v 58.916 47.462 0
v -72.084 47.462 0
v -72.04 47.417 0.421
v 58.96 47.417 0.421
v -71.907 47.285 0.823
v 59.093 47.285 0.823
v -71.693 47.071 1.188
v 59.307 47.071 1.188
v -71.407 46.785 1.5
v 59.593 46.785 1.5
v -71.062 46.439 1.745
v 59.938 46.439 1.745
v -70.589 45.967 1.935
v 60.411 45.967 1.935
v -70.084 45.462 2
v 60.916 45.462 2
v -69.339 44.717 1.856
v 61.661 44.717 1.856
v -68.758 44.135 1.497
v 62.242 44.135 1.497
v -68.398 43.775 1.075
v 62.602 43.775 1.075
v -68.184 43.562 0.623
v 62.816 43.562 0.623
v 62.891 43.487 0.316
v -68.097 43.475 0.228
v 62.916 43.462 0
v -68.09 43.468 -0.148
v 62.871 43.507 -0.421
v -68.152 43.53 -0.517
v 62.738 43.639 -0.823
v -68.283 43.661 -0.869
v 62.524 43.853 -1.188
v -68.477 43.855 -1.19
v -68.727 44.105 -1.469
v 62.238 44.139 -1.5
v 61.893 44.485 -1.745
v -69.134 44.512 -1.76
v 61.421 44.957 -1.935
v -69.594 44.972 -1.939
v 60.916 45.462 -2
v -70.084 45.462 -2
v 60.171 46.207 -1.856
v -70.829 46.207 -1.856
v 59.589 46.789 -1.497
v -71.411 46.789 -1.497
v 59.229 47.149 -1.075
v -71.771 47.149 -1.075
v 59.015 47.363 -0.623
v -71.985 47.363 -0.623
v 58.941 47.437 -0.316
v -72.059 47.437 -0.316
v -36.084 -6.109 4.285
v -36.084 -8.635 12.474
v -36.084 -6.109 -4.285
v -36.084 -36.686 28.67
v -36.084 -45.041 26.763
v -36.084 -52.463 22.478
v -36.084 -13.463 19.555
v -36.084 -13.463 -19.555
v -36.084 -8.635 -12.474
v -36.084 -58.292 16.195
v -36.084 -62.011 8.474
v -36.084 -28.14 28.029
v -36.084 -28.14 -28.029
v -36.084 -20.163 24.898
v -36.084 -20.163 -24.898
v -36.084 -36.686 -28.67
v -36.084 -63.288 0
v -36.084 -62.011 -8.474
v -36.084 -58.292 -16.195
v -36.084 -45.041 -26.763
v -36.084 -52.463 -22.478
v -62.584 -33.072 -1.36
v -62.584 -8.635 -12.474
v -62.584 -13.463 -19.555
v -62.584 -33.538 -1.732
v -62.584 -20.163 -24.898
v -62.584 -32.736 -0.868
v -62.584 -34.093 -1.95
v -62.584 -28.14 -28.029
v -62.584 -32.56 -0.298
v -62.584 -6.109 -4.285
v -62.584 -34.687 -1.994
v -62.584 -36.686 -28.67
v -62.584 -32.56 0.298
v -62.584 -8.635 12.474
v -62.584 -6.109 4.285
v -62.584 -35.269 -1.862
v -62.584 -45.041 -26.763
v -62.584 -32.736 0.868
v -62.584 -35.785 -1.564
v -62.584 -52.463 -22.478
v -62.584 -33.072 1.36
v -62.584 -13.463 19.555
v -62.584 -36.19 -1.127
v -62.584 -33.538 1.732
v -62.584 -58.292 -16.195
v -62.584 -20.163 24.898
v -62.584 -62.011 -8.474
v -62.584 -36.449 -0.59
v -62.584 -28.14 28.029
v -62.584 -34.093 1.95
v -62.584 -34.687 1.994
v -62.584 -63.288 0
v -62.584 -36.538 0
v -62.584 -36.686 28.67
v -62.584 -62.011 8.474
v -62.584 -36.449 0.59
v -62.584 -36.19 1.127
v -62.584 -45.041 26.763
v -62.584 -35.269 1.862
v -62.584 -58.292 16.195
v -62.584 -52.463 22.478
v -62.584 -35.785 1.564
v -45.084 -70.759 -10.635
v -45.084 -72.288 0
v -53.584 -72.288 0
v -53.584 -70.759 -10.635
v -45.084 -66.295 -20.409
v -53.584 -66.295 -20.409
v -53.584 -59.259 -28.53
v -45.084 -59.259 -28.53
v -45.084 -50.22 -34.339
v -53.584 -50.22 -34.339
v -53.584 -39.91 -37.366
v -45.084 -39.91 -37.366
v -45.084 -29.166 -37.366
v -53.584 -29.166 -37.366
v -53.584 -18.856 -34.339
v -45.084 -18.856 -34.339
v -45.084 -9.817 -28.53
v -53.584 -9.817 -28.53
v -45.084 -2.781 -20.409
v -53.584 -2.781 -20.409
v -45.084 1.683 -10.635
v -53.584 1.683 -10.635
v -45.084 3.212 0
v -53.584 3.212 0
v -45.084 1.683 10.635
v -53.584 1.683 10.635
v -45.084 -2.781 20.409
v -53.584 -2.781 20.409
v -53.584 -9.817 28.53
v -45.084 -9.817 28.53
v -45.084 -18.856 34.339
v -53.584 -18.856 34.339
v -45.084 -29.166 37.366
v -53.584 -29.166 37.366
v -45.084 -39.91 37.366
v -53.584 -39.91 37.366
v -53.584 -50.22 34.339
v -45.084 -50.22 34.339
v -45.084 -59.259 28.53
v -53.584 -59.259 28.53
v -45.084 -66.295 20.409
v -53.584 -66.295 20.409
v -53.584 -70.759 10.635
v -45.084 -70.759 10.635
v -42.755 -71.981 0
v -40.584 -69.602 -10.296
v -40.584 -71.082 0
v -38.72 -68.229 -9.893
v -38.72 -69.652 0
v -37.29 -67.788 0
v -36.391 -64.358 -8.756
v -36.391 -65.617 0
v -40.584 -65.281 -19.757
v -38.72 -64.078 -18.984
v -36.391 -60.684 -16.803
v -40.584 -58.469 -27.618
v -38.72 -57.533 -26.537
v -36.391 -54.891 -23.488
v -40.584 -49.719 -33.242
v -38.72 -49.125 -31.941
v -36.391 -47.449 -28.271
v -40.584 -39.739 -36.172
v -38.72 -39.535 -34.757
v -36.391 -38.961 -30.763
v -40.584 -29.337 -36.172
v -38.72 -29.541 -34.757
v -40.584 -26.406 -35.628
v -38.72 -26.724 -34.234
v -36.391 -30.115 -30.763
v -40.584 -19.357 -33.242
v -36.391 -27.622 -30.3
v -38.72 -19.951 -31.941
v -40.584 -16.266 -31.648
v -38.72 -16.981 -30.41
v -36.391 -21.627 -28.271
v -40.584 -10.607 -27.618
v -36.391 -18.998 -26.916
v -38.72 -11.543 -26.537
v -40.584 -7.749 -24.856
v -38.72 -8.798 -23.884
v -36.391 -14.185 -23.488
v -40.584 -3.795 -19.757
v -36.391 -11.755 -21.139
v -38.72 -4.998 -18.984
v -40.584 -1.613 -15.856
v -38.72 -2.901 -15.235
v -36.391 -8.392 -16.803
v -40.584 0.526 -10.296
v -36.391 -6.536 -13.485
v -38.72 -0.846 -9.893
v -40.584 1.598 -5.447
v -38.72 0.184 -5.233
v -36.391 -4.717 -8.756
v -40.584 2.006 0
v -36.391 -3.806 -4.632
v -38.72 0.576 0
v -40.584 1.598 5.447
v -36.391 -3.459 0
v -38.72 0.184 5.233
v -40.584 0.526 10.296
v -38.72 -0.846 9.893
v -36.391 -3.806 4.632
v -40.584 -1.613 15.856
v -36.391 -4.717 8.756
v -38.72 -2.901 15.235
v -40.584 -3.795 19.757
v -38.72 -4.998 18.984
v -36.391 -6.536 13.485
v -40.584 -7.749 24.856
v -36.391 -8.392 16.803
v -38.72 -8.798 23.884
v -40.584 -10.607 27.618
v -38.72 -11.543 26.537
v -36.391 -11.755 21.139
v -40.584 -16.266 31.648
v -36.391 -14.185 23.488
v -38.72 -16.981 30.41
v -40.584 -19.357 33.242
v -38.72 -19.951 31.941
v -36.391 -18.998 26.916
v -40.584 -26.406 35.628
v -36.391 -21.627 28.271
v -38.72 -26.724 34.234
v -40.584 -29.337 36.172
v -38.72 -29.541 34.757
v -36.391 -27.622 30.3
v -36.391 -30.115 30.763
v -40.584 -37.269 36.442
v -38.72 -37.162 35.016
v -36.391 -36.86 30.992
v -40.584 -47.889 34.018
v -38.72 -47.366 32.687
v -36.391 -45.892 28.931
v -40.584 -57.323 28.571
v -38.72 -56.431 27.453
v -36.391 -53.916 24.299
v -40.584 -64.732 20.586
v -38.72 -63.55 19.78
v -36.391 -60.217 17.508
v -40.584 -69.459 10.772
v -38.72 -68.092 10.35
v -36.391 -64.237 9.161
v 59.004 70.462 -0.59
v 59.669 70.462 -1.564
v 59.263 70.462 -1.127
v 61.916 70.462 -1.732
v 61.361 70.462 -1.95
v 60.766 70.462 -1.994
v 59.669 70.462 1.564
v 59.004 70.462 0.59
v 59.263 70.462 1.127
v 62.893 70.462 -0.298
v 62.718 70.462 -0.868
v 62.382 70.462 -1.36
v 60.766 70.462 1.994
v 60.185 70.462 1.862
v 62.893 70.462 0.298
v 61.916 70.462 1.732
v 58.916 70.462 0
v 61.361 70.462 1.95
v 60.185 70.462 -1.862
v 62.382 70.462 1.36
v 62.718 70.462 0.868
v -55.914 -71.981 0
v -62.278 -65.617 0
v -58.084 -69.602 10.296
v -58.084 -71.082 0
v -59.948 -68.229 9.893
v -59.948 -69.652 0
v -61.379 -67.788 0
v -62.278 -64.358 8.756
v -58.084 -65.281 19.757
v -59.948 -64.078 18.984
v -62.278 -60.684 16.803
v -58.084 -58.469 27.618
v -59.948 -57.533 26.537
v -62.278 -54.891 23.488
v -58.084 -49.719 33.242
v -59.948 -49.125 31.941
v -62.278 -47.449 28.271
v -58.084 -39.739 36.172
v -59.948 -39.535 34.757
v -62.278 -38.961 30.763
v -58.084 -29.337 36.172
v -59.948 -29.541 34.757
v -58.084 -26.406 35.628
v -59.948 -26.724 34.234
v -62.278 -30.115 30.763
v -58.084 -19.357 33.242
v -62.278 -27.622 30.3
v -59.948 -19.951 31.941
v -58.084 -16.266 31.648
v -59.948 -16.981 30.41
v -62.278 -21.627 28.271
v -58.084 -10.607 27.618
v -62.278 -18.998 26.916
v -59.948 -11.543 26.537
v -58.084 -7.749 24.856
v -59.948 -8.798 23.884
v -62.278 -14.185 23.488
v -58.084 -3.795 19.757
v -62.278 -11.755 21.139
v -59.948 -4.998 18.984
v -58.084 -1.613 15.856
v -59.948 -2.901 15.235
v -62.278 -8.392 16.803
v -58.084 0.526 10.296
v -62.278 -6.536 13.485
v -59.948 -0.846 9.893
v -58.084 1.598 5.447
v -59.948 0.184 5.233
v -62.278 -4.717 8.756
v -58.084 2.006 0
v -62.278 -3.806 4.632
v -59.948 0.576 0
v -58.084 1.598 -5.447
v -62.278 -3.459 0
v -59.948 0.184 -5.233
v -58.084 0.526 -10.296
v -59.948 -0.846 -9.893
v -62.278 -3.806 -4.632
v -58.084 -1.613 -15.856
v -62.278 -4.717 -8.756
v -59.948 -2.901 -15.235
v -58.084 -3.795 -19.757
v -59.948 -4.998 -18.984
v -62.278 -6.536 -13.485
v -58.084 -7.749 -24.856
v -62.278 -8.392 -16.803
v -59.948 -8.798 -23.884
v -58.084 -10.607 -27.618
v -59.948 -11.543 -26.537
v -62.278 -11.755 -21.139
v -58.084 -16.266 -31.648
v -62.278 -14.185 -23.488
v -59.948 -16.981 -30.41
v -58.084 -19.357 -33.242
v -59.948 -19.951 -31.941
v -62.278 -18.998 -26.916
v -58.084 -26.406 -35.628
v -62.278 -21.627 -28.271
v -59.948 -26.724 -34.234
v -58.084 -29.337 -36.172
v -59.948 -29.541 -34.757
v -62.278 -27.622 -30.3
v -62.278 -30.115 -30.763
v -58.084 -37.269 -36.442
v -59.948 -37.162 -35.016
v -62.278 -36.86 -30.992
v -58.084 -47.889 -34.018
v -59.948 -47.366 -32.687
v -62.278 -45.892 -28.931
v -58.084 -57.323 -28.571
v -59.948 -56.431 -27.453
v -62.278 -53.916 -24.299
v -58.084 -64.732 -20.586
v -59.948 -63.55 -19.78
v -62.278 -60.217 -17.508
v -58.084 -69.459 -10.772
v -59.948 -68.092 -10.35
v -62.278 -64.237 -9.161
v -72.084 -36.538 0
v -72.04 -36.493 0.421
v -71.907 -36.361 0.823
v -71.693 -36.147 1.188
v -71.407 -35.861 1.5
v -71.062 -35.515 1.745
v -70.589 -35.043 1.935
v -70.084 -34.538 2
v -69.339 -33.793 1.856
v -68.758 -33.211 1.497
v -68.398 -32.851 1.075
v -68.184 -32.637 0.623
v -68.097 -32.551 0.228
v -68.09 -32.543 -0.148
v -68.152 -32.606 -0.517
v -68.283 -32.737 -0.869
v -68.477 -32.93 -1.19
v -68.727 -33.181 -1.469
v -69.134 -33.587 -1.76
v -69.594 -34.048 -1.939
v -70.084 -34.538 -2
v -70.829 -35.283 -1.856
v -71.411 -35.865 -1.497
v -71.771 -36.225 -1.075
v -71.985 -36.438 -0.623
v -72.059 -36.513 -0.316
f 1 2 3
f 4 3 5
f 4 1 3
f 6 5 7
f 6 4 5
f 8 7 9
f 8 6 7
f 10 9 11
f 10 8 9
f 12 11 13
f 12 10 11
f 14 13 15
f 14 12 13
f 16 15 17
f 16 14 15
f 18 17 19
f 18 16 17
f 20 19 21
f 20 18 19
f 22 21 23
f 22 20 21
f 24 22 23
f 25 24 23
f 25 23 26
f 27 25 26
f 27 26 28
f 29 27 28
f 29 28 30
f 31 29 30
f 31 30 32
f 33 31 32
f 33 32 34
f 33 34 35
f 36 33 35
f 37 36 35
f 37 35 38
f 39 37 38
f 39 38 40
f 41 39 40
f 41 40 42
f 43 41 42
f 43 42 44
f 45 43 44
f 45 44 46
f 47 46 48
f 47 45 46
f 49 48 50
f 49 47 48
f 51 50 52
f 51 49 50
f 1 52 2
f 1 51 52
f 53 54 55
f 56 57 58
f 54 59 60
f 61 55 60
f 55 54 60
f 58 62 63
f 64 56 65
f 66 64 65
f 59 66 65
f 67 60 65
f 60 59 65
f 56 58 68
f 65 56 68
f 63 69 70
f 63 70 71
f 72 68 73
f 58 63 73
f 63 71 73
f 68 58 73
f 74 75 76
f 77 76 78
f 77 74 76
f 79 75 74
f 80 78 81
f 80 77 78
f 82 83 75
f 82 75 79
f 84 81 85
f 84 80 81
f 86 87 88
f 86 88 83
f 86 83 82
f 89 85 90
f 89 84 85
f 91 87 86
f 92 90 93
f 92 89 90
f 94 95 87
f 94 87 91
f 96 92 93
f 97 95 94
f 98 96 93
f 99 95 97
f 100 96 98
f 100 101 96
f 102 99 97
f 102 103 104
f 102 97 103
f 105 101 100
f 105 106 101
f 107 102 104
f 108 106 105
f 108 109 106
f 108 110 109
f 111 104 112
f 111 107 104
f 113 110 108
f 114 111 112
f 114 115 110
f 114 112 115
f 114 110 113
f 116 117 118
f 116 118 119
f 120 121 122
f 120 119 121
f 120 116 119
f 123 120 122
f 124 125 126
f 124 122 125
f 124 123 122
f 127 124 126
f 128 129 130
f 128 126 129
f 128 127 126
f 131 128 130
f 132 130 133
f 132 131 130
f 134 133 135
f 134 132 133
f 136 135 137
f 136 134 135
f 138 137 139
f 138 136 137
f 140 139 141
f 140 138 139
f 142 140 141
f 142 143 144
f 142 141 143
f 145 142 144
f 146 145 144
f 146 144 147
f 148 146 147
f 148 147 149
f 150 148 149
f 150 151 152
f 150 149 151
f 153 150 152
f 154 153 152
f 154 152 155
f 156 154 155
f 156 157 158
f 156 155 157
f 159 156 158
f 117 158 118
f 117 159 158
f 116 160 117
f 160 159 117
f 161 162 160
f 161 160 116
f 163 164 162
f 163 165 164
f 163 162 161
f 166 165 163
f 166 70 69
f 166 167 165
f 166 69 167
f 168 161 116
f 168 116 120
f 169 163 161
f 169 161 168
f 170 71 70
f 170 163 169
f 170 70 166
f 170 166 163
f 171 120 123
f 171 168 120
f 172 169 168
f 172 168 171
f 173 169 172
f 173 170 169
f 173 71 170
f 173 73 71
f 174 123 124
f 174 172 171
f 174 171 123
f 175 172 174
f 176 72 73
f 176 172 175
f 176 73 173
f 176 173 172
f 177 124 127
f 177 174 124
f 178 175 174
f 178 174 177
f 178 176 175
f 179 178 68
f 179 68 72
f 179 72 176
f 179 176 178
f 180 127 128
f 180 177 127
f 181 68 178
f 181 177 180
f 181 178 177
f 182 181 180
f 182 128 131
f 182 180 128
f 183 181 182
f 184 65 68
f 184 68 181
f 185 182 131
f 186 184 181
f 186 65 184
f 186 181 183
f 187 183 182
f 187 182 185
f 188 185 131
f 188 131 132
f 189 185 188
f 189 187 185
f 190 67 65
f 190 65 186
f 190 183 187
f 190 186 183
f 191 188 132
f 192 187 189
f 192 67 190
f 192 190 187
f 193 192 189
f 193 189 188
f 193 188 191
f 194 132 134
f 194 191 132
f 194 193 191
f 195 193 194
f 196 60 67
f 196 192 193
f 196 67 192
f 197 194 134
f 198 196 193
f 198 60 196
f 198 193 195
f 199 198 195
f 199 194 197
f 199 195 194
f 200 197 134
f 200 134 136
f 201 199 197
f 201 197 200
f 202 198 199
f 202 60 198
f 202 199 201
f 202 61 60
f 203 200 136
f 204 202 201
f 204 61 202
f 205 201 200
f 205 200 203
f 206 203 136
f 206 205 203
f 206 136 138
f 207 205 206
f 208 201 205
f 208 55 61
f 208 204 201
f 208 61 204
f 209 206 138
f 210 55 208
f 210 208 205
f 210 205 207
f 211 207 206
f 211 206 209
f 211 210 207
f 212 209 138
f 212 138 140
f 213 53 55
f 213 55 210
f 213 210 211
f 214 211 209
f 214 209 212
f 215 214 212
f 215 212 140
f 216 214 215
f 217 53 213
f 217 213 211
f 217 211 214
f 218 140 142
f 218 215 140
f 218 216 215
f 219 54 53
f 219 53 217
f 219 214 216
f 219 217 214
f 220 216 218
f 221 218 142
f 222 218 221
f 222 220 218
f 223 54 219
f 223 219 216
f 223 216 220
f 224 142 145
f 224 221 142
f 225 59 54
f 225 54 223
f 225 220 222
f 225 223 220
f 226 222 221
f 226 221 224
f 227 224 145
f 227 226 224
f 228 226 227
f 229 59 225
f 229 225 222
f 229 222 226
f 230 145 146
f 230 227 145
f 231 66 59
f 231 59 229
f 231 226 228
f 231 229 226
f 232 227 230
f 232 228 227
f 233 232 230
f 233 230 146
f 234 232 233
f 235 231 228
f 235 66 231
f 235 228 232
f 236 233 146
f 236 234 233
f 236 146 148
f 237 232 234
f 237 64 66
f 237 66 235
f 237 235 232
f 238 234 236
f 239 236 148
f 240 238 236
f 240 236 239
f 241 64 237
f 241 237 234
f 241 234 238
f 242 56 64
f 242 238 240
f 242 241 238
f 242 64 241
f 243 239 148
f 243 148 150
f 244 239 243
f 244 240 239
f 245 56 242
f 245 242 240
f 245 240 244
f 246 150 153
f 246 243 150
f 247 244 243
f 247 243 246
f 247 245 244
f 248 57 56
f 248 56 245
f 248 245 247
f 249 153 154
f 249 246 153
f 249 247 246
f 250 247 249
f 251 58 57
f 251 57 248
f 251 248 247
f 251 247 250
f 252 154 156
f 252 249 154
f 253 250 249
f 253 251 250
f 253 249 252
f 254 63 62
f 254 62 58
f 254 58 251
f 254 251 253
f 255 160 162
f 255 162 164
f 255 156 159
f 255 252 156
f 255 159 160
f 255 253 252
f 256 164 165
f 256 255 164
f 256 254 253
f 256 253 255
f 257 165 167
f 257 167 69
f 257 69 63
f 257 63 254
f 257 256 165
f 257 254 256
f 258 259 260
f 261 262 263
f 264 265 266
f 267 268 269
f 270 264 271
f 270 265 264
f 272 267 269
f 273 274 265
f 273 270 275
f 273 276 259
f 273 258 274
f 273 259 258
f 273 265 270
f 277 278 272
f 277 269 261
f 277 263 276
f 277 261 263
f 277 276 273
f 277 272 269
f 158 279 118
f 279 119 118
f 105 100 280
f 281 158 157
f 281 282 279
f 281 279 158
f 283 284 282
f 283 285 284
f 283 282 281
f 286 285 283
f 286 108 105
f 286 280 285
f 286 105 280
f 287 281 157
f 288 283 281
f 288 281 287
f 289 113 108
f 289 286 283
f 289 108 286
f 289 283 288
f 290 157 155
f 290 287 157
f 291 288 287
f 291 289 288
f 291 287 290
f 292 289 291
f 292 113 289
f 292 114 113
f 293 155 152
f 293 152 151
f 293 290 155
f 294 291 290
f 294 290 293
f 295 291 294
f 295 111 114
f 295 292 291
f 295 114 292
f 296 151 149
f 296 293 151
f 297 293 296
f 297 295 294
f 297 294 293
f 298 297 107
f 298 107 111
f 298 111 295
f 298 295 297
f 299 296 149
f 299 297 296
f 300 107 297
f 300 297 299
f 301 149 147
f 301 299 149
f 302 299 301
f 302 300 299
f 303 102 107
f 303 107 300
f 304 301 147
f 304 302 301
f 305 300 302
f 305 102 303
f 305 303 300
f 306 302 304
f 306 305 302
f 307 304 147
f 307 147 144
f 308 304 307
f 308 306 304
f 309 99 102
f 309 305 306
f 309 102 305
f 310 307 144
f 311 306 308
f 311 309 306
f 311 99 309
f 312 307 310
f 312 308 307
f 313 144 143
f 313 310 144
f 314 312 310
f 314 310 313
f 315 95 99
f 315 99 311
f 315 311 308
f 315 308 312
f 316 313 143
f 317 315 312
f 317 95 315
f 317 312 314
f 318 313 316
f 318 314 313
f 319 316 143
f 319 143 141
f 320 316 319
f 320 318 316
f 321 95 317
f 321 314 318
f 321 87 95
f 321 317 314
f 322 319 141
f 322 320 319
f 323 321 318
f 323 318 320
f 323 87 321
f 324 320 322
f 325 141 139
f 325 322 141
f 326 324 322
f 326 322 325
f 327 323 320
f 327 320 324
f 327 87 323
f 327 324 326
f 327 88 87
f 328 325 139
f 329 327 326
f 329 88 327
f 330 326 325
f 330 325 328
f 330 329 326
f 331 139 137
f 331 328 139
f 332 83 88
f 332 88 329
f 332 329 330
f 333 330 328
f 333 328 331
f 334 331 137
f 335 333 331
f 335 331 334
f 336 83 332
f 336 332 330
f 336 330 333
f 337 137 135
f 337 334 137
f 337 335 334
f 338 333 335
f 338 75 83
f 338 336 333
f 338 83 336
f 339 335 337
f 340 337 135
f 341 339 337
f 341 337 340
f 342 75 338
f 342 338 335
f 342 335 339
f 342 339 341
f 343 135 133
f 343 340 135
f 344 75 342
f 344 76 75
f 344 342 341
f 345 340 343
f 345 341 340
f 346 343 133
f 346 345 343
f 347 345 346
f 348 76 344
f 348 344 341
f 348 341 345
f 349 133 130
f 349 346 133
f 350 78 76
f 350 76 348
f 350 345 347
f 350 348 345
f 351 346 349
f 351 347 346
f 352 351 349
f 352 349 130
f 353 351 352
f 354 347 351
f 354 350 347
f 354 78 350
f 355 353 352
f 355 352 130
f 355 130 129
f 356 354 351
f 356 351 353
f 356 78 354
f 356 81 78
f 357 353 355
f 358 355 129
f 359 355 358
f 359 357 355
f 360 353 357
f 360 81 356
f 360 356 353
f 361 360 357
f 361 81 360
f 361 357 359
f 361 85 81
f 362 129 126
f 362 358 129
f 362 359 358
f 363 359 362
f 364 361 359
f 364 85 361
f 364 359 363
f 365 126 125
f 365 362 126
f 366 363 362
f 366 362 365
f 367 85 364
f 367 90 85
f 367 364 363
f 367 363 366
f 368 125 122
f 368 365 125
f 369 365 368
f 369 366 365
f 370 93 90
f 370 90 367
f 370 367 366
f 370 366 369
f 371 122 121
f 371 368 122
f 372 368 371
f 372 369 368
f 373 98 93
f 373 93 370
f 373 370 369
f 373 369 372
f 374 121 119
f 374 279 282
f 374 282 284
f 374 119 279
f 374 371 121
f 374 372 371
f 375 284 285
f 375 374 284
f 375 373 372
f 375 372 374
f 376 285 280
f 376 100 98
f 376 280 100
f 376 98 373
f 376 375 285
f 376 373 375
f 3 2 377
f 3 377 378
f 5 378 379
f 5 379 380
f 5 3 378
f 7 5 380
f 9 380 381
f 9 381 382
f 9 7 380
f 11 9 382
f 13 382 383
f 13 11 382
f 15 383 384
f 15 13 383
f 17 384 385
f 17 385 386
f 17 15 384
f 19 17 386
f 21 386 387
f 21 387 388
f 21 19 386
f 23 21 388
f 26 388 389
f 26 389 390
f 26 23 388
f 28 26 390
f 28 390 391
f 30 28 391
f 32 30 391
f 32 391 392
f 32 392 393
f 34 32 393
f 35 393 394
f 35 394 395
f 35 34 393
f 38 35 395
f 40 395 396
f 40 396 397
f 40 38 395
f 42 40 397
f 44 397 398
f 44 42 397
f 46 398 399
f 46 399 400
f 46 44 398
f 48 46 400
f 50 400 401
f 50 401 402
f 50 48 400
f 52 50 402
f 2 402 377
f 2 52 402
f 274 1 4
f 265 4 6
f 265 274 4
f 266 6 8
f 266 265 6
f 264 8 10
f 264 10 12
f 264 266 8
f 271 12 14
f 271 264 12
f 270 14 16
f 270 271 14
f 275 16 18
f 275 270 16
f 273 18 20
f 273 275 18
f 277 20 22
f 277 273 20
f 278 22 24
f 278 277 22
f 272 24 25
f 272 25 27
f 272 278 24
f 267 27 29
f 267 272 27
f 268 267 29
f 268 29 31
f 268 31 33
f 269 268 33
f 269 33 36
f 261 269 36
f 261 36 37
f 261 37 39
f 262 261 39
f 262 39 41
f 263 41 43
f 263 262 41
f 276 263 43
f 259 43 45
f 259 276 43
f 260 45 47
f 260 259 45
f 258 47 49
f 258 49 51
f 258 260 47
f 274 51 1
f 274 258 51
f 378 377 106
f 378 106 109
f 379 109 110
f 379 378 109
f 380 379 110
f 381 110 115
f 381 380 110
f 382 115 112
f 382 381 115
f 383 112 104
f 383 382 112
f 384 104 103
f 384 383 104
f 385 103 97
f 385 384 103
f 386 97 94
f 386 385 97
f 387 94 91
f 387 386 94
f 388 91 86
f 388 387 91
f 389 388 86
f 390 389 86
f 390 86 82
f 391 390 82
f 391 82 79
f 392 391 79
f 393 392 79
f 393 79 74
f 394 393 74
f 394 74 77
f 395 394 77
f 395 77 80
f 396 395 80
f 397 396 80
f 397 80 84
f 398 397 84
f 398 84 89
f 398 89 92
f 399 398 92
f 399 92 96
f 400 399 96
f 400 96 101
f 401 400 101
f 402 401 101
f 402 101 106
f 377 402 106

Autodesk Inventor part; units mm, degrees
ref_plane "YZ Plane" through (0, 0, 0) normal (1, 0, 0) x (0, 1, 0)
ref_plane "XZ Plane" through (0, 0, 0) normal (0, 1, 0) x (-1, 0, 0)
ref_plane "XY Plane" through (0, 0, 0) normal (0, 0, 1) x (1, 0, 0)
ref_plane "Work Plane1" through (-36.0844, -34.5379, 0) normal (-1, 0, 0) x (0, -1, 0)
sketch "Sketch1" plane through (-36.0844, -34.5379, 0) normal (-1, 0, 0) x (0, -1, 0)
  circle A0 centre (0, 0) radius 37.75
  point P0 (-34.5379, 0)
  dimension "d4" = 75.5
extrude "Extrusion1" add sketch "Sketch1" along normal blind 26.5
fillet "Fillet1" radius 9 2 edges at (-62.5844, 3.2121, 0) (-36.0844, 3.2121, 0)
sketch "Sketch2" plane through (-36.0844, -34.5379, 0) normal (-1, 0, 0) x (0, -1, 0)
  circle A0 centre (0, 0) radius 2
  point P0 (-34.5379, 0)
  dimension "d8" = 4
sketch3d "3D Sketch1"
  line L0 (-36.0844, -34.5379, 0) -> (-70.0844, -34.5379, 0)
  line L1 (-70.0844, -34.5379, 0) -> (-70.0844, 45.4621, 0)
  line L2 (-70.0844, 45.4621, 0) -> (60.9156, 45.4621, 0)
  line L3 (60.9156, 45.4621, 0) -> (60.9156, 70.4621, 0)
  dimension "d0" = 34
  dimension "d1" = 80
  dimension "d2" = 131
  dimension "d3" = 25
sweep "Sweep1" add profiles "Sketch2" path "3D Sketch1"
properties part number "Main Landing Gear"
